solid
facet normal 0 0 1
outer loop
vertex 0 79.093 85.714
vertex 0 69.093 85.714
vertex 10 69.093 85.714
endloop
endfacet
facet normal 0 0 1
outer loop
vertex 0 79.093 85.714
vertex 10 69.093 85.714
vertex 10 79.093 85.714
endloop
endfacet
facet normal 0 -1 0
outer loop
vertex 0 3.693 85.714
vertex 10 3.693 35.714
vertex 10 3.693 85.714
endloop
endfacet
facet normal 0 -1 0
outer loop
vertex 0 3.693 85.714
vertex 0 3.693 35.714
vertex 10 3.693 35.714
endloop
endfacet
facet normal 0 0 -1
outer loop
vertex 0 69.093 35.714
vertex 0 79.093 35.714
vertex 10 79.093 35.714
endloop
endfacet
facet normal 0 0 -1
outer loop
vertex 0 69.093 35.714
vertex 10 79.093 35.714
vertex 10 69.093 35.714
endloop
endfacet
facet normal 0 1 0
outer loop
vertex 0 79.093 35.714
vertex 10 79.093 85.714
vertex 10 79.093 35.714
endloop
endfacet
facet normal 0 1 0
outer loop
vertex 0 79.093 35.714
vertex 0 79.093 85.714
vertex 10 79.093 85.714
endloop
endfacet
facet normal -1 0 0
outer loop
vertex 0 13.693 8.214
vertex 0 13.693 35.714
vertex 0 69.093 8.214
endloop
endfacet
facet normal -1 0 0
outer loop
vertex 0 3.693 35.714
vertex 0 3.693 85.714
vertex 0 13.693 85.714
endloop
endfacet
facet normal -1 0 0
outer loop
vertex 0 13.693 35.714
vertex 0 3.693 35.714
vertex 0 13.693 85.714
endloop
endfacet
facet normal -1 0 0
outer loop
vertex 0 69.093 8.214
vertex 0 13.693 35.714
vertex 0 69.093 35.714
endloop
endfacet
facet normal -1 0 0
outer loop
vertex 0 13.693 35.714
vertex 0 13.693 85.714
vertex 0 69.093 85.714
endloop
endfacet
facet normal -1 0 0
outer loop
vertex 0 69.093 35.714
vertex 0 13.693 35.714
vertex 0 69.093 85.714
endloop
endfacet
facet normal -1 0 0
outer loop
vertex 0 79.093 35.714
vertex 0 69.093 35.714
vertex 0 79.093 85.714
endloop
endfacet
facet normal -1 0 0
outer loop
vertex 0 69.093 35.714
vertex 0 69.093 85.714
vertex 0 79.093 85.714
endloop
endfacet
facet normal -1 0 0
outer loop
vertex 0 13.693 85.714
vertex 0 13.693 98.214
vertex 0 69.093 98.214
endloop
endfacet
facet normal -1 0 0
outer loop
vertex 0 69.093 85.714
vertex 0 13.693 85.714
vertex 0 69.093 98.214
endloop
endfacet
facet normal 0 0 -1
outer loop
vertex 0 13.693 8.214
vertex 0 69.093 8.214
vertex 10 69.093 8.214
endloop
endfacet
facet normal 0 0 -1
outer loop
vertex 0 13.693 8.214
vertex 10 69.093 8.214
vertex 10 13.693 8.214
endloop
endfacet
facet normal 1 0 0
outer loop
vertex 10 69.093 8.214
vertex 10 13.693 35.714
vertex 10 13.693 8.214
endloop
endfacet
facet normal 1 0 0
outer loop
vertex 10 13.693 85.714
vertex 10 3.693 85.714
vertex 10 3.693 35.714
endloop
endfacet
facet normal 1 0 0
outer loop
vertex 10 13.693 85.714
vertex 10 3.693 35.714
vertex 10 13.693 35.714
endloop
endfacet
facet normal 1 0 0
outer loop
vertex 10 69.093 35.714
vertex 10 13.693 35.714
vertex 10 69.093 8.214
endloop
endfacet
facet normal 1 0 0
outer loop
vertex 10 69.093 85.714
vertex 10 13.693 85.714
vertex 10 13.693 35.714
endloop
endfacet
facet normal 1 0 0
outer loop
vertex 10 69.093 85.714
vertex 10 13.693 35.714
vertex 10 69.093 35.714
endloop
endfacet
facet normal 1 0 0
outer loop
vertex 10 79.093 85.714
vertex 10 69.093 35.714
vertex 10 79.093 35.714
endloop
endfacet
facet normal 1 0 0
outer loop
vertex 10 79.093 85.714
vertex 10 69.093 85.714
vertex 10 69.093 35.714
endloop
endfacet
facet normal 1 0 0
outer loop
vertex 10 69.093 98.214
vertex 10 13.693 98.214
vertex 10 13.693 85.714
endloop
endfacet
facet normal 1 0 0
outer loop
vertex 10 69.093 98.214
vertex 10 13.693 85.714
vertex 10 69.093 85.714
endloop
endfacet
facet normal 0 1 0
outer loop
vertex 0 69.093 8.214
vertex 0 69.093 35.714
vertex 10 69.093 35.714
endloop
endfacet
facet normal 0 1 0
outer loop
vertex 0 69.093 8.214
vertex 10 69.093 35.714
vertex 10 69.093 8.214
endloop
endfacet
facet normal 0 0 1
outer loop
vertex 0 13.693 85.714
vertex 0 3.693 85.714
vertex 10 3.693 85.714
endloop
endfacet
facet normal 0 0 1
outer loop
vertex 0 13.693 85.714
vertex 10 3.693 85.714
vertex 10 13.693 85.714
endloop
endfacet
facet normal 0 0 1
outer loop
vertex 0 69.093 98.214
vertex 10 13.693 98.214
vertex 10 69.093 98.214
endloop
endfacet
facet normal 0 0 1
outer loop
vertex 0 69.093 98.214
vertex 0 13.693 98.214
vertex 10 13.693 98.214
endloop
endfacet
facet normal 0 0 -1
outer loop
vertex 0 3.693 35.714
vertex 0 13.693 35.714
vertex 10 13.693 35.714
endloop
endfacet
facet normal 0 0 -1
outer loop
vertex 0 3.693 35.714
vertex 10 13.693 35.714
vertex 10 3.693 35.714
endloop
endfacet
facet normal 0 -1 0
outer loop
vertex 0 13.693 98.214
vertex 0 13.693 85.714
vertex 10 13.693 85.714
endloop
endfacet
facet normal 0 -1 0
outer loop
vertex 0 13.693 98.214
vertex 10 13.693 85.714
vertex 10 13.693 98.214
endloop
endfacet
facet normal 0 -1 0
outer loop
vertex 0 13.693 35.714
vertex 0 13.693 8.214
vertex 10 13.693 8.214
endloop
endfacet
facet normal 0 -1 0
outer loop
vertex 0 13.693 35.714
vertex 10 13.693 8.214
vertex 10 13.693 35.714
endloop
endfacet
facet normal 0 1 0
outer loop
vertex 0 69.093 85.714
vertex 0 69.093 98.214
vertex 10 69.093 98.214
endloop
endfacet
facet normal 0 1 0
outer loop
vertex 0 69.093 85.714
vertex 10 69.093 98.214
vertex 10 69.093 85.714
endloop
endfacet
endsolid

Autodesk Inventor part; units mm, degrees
ref_plane "YZ Plane" through (0, 0, 0) normal (1, 0, 0) x (0, 1, 0)
ref_plane "XZ Plane" through (0, 0, 0) normal (0, 1, 0) x (-1, 0, 0)
ref_plane "XY Plane" through (0, 0, 0) normal (0, 0, 1) x (1, 0, 0)
sketch "Sketch1" plane through (0, 0, 0) normal (1, 0, 0) x (0, 1, 0)
  line L0 (69.0933, 8.2135) -> (13.6933, 8.2135)
  line L1 (13.6933, 8.2135) -> (13.6933, 35.7135)
  line L2 (13.6933, 35.7135) -> (3.6933, 35.7135)
  line L3 (3.6933, 35.7135) -> (3.6933, 85.7135)
  line L4 (3.6933, 85.7135) -> (13.6933, 85.7135)
  line L5 (13.6933, 85.7135) -> (13.6933, 98.2135)
  line L6 (13.6933, 98.2135) -> (69.0933, 98.2135)
  line L7 (69.0933, 98.2135) -> (69.0933, 85.7135)
  line L8 (69.0933, 85.7135) -> (79.0933, 85.7135)
  line L9 (79.0933, 85.7135) -> (79.0933, 35.7135)
  line L10 (79.0933, 35.7135) -> (69.0933, 35.7135)
  line L11 (69.0933, 35.7135) -> (69.0933, 8.2135)
  point P0 (0, 0)
  dimension "d0" = 55.4
  dimension "d1" = 10
  dimension "d2" = 10
  dimension "d3" = 10
  dimension "d4" = 27.5
  dimension "d5" = 12.5
  dimension "d8" = 50
extrude "Extrusion1" add sketch "Sketch1" along normal blind 10
equation "\"d1\" = Width"
equation "\"d2\" = Width"
equation "\"d3\" = Width"
equation "\"d6\" = Width"
equation "\"Width\" = 10"
properties part number "SideWall" material "ABS Plastic"
